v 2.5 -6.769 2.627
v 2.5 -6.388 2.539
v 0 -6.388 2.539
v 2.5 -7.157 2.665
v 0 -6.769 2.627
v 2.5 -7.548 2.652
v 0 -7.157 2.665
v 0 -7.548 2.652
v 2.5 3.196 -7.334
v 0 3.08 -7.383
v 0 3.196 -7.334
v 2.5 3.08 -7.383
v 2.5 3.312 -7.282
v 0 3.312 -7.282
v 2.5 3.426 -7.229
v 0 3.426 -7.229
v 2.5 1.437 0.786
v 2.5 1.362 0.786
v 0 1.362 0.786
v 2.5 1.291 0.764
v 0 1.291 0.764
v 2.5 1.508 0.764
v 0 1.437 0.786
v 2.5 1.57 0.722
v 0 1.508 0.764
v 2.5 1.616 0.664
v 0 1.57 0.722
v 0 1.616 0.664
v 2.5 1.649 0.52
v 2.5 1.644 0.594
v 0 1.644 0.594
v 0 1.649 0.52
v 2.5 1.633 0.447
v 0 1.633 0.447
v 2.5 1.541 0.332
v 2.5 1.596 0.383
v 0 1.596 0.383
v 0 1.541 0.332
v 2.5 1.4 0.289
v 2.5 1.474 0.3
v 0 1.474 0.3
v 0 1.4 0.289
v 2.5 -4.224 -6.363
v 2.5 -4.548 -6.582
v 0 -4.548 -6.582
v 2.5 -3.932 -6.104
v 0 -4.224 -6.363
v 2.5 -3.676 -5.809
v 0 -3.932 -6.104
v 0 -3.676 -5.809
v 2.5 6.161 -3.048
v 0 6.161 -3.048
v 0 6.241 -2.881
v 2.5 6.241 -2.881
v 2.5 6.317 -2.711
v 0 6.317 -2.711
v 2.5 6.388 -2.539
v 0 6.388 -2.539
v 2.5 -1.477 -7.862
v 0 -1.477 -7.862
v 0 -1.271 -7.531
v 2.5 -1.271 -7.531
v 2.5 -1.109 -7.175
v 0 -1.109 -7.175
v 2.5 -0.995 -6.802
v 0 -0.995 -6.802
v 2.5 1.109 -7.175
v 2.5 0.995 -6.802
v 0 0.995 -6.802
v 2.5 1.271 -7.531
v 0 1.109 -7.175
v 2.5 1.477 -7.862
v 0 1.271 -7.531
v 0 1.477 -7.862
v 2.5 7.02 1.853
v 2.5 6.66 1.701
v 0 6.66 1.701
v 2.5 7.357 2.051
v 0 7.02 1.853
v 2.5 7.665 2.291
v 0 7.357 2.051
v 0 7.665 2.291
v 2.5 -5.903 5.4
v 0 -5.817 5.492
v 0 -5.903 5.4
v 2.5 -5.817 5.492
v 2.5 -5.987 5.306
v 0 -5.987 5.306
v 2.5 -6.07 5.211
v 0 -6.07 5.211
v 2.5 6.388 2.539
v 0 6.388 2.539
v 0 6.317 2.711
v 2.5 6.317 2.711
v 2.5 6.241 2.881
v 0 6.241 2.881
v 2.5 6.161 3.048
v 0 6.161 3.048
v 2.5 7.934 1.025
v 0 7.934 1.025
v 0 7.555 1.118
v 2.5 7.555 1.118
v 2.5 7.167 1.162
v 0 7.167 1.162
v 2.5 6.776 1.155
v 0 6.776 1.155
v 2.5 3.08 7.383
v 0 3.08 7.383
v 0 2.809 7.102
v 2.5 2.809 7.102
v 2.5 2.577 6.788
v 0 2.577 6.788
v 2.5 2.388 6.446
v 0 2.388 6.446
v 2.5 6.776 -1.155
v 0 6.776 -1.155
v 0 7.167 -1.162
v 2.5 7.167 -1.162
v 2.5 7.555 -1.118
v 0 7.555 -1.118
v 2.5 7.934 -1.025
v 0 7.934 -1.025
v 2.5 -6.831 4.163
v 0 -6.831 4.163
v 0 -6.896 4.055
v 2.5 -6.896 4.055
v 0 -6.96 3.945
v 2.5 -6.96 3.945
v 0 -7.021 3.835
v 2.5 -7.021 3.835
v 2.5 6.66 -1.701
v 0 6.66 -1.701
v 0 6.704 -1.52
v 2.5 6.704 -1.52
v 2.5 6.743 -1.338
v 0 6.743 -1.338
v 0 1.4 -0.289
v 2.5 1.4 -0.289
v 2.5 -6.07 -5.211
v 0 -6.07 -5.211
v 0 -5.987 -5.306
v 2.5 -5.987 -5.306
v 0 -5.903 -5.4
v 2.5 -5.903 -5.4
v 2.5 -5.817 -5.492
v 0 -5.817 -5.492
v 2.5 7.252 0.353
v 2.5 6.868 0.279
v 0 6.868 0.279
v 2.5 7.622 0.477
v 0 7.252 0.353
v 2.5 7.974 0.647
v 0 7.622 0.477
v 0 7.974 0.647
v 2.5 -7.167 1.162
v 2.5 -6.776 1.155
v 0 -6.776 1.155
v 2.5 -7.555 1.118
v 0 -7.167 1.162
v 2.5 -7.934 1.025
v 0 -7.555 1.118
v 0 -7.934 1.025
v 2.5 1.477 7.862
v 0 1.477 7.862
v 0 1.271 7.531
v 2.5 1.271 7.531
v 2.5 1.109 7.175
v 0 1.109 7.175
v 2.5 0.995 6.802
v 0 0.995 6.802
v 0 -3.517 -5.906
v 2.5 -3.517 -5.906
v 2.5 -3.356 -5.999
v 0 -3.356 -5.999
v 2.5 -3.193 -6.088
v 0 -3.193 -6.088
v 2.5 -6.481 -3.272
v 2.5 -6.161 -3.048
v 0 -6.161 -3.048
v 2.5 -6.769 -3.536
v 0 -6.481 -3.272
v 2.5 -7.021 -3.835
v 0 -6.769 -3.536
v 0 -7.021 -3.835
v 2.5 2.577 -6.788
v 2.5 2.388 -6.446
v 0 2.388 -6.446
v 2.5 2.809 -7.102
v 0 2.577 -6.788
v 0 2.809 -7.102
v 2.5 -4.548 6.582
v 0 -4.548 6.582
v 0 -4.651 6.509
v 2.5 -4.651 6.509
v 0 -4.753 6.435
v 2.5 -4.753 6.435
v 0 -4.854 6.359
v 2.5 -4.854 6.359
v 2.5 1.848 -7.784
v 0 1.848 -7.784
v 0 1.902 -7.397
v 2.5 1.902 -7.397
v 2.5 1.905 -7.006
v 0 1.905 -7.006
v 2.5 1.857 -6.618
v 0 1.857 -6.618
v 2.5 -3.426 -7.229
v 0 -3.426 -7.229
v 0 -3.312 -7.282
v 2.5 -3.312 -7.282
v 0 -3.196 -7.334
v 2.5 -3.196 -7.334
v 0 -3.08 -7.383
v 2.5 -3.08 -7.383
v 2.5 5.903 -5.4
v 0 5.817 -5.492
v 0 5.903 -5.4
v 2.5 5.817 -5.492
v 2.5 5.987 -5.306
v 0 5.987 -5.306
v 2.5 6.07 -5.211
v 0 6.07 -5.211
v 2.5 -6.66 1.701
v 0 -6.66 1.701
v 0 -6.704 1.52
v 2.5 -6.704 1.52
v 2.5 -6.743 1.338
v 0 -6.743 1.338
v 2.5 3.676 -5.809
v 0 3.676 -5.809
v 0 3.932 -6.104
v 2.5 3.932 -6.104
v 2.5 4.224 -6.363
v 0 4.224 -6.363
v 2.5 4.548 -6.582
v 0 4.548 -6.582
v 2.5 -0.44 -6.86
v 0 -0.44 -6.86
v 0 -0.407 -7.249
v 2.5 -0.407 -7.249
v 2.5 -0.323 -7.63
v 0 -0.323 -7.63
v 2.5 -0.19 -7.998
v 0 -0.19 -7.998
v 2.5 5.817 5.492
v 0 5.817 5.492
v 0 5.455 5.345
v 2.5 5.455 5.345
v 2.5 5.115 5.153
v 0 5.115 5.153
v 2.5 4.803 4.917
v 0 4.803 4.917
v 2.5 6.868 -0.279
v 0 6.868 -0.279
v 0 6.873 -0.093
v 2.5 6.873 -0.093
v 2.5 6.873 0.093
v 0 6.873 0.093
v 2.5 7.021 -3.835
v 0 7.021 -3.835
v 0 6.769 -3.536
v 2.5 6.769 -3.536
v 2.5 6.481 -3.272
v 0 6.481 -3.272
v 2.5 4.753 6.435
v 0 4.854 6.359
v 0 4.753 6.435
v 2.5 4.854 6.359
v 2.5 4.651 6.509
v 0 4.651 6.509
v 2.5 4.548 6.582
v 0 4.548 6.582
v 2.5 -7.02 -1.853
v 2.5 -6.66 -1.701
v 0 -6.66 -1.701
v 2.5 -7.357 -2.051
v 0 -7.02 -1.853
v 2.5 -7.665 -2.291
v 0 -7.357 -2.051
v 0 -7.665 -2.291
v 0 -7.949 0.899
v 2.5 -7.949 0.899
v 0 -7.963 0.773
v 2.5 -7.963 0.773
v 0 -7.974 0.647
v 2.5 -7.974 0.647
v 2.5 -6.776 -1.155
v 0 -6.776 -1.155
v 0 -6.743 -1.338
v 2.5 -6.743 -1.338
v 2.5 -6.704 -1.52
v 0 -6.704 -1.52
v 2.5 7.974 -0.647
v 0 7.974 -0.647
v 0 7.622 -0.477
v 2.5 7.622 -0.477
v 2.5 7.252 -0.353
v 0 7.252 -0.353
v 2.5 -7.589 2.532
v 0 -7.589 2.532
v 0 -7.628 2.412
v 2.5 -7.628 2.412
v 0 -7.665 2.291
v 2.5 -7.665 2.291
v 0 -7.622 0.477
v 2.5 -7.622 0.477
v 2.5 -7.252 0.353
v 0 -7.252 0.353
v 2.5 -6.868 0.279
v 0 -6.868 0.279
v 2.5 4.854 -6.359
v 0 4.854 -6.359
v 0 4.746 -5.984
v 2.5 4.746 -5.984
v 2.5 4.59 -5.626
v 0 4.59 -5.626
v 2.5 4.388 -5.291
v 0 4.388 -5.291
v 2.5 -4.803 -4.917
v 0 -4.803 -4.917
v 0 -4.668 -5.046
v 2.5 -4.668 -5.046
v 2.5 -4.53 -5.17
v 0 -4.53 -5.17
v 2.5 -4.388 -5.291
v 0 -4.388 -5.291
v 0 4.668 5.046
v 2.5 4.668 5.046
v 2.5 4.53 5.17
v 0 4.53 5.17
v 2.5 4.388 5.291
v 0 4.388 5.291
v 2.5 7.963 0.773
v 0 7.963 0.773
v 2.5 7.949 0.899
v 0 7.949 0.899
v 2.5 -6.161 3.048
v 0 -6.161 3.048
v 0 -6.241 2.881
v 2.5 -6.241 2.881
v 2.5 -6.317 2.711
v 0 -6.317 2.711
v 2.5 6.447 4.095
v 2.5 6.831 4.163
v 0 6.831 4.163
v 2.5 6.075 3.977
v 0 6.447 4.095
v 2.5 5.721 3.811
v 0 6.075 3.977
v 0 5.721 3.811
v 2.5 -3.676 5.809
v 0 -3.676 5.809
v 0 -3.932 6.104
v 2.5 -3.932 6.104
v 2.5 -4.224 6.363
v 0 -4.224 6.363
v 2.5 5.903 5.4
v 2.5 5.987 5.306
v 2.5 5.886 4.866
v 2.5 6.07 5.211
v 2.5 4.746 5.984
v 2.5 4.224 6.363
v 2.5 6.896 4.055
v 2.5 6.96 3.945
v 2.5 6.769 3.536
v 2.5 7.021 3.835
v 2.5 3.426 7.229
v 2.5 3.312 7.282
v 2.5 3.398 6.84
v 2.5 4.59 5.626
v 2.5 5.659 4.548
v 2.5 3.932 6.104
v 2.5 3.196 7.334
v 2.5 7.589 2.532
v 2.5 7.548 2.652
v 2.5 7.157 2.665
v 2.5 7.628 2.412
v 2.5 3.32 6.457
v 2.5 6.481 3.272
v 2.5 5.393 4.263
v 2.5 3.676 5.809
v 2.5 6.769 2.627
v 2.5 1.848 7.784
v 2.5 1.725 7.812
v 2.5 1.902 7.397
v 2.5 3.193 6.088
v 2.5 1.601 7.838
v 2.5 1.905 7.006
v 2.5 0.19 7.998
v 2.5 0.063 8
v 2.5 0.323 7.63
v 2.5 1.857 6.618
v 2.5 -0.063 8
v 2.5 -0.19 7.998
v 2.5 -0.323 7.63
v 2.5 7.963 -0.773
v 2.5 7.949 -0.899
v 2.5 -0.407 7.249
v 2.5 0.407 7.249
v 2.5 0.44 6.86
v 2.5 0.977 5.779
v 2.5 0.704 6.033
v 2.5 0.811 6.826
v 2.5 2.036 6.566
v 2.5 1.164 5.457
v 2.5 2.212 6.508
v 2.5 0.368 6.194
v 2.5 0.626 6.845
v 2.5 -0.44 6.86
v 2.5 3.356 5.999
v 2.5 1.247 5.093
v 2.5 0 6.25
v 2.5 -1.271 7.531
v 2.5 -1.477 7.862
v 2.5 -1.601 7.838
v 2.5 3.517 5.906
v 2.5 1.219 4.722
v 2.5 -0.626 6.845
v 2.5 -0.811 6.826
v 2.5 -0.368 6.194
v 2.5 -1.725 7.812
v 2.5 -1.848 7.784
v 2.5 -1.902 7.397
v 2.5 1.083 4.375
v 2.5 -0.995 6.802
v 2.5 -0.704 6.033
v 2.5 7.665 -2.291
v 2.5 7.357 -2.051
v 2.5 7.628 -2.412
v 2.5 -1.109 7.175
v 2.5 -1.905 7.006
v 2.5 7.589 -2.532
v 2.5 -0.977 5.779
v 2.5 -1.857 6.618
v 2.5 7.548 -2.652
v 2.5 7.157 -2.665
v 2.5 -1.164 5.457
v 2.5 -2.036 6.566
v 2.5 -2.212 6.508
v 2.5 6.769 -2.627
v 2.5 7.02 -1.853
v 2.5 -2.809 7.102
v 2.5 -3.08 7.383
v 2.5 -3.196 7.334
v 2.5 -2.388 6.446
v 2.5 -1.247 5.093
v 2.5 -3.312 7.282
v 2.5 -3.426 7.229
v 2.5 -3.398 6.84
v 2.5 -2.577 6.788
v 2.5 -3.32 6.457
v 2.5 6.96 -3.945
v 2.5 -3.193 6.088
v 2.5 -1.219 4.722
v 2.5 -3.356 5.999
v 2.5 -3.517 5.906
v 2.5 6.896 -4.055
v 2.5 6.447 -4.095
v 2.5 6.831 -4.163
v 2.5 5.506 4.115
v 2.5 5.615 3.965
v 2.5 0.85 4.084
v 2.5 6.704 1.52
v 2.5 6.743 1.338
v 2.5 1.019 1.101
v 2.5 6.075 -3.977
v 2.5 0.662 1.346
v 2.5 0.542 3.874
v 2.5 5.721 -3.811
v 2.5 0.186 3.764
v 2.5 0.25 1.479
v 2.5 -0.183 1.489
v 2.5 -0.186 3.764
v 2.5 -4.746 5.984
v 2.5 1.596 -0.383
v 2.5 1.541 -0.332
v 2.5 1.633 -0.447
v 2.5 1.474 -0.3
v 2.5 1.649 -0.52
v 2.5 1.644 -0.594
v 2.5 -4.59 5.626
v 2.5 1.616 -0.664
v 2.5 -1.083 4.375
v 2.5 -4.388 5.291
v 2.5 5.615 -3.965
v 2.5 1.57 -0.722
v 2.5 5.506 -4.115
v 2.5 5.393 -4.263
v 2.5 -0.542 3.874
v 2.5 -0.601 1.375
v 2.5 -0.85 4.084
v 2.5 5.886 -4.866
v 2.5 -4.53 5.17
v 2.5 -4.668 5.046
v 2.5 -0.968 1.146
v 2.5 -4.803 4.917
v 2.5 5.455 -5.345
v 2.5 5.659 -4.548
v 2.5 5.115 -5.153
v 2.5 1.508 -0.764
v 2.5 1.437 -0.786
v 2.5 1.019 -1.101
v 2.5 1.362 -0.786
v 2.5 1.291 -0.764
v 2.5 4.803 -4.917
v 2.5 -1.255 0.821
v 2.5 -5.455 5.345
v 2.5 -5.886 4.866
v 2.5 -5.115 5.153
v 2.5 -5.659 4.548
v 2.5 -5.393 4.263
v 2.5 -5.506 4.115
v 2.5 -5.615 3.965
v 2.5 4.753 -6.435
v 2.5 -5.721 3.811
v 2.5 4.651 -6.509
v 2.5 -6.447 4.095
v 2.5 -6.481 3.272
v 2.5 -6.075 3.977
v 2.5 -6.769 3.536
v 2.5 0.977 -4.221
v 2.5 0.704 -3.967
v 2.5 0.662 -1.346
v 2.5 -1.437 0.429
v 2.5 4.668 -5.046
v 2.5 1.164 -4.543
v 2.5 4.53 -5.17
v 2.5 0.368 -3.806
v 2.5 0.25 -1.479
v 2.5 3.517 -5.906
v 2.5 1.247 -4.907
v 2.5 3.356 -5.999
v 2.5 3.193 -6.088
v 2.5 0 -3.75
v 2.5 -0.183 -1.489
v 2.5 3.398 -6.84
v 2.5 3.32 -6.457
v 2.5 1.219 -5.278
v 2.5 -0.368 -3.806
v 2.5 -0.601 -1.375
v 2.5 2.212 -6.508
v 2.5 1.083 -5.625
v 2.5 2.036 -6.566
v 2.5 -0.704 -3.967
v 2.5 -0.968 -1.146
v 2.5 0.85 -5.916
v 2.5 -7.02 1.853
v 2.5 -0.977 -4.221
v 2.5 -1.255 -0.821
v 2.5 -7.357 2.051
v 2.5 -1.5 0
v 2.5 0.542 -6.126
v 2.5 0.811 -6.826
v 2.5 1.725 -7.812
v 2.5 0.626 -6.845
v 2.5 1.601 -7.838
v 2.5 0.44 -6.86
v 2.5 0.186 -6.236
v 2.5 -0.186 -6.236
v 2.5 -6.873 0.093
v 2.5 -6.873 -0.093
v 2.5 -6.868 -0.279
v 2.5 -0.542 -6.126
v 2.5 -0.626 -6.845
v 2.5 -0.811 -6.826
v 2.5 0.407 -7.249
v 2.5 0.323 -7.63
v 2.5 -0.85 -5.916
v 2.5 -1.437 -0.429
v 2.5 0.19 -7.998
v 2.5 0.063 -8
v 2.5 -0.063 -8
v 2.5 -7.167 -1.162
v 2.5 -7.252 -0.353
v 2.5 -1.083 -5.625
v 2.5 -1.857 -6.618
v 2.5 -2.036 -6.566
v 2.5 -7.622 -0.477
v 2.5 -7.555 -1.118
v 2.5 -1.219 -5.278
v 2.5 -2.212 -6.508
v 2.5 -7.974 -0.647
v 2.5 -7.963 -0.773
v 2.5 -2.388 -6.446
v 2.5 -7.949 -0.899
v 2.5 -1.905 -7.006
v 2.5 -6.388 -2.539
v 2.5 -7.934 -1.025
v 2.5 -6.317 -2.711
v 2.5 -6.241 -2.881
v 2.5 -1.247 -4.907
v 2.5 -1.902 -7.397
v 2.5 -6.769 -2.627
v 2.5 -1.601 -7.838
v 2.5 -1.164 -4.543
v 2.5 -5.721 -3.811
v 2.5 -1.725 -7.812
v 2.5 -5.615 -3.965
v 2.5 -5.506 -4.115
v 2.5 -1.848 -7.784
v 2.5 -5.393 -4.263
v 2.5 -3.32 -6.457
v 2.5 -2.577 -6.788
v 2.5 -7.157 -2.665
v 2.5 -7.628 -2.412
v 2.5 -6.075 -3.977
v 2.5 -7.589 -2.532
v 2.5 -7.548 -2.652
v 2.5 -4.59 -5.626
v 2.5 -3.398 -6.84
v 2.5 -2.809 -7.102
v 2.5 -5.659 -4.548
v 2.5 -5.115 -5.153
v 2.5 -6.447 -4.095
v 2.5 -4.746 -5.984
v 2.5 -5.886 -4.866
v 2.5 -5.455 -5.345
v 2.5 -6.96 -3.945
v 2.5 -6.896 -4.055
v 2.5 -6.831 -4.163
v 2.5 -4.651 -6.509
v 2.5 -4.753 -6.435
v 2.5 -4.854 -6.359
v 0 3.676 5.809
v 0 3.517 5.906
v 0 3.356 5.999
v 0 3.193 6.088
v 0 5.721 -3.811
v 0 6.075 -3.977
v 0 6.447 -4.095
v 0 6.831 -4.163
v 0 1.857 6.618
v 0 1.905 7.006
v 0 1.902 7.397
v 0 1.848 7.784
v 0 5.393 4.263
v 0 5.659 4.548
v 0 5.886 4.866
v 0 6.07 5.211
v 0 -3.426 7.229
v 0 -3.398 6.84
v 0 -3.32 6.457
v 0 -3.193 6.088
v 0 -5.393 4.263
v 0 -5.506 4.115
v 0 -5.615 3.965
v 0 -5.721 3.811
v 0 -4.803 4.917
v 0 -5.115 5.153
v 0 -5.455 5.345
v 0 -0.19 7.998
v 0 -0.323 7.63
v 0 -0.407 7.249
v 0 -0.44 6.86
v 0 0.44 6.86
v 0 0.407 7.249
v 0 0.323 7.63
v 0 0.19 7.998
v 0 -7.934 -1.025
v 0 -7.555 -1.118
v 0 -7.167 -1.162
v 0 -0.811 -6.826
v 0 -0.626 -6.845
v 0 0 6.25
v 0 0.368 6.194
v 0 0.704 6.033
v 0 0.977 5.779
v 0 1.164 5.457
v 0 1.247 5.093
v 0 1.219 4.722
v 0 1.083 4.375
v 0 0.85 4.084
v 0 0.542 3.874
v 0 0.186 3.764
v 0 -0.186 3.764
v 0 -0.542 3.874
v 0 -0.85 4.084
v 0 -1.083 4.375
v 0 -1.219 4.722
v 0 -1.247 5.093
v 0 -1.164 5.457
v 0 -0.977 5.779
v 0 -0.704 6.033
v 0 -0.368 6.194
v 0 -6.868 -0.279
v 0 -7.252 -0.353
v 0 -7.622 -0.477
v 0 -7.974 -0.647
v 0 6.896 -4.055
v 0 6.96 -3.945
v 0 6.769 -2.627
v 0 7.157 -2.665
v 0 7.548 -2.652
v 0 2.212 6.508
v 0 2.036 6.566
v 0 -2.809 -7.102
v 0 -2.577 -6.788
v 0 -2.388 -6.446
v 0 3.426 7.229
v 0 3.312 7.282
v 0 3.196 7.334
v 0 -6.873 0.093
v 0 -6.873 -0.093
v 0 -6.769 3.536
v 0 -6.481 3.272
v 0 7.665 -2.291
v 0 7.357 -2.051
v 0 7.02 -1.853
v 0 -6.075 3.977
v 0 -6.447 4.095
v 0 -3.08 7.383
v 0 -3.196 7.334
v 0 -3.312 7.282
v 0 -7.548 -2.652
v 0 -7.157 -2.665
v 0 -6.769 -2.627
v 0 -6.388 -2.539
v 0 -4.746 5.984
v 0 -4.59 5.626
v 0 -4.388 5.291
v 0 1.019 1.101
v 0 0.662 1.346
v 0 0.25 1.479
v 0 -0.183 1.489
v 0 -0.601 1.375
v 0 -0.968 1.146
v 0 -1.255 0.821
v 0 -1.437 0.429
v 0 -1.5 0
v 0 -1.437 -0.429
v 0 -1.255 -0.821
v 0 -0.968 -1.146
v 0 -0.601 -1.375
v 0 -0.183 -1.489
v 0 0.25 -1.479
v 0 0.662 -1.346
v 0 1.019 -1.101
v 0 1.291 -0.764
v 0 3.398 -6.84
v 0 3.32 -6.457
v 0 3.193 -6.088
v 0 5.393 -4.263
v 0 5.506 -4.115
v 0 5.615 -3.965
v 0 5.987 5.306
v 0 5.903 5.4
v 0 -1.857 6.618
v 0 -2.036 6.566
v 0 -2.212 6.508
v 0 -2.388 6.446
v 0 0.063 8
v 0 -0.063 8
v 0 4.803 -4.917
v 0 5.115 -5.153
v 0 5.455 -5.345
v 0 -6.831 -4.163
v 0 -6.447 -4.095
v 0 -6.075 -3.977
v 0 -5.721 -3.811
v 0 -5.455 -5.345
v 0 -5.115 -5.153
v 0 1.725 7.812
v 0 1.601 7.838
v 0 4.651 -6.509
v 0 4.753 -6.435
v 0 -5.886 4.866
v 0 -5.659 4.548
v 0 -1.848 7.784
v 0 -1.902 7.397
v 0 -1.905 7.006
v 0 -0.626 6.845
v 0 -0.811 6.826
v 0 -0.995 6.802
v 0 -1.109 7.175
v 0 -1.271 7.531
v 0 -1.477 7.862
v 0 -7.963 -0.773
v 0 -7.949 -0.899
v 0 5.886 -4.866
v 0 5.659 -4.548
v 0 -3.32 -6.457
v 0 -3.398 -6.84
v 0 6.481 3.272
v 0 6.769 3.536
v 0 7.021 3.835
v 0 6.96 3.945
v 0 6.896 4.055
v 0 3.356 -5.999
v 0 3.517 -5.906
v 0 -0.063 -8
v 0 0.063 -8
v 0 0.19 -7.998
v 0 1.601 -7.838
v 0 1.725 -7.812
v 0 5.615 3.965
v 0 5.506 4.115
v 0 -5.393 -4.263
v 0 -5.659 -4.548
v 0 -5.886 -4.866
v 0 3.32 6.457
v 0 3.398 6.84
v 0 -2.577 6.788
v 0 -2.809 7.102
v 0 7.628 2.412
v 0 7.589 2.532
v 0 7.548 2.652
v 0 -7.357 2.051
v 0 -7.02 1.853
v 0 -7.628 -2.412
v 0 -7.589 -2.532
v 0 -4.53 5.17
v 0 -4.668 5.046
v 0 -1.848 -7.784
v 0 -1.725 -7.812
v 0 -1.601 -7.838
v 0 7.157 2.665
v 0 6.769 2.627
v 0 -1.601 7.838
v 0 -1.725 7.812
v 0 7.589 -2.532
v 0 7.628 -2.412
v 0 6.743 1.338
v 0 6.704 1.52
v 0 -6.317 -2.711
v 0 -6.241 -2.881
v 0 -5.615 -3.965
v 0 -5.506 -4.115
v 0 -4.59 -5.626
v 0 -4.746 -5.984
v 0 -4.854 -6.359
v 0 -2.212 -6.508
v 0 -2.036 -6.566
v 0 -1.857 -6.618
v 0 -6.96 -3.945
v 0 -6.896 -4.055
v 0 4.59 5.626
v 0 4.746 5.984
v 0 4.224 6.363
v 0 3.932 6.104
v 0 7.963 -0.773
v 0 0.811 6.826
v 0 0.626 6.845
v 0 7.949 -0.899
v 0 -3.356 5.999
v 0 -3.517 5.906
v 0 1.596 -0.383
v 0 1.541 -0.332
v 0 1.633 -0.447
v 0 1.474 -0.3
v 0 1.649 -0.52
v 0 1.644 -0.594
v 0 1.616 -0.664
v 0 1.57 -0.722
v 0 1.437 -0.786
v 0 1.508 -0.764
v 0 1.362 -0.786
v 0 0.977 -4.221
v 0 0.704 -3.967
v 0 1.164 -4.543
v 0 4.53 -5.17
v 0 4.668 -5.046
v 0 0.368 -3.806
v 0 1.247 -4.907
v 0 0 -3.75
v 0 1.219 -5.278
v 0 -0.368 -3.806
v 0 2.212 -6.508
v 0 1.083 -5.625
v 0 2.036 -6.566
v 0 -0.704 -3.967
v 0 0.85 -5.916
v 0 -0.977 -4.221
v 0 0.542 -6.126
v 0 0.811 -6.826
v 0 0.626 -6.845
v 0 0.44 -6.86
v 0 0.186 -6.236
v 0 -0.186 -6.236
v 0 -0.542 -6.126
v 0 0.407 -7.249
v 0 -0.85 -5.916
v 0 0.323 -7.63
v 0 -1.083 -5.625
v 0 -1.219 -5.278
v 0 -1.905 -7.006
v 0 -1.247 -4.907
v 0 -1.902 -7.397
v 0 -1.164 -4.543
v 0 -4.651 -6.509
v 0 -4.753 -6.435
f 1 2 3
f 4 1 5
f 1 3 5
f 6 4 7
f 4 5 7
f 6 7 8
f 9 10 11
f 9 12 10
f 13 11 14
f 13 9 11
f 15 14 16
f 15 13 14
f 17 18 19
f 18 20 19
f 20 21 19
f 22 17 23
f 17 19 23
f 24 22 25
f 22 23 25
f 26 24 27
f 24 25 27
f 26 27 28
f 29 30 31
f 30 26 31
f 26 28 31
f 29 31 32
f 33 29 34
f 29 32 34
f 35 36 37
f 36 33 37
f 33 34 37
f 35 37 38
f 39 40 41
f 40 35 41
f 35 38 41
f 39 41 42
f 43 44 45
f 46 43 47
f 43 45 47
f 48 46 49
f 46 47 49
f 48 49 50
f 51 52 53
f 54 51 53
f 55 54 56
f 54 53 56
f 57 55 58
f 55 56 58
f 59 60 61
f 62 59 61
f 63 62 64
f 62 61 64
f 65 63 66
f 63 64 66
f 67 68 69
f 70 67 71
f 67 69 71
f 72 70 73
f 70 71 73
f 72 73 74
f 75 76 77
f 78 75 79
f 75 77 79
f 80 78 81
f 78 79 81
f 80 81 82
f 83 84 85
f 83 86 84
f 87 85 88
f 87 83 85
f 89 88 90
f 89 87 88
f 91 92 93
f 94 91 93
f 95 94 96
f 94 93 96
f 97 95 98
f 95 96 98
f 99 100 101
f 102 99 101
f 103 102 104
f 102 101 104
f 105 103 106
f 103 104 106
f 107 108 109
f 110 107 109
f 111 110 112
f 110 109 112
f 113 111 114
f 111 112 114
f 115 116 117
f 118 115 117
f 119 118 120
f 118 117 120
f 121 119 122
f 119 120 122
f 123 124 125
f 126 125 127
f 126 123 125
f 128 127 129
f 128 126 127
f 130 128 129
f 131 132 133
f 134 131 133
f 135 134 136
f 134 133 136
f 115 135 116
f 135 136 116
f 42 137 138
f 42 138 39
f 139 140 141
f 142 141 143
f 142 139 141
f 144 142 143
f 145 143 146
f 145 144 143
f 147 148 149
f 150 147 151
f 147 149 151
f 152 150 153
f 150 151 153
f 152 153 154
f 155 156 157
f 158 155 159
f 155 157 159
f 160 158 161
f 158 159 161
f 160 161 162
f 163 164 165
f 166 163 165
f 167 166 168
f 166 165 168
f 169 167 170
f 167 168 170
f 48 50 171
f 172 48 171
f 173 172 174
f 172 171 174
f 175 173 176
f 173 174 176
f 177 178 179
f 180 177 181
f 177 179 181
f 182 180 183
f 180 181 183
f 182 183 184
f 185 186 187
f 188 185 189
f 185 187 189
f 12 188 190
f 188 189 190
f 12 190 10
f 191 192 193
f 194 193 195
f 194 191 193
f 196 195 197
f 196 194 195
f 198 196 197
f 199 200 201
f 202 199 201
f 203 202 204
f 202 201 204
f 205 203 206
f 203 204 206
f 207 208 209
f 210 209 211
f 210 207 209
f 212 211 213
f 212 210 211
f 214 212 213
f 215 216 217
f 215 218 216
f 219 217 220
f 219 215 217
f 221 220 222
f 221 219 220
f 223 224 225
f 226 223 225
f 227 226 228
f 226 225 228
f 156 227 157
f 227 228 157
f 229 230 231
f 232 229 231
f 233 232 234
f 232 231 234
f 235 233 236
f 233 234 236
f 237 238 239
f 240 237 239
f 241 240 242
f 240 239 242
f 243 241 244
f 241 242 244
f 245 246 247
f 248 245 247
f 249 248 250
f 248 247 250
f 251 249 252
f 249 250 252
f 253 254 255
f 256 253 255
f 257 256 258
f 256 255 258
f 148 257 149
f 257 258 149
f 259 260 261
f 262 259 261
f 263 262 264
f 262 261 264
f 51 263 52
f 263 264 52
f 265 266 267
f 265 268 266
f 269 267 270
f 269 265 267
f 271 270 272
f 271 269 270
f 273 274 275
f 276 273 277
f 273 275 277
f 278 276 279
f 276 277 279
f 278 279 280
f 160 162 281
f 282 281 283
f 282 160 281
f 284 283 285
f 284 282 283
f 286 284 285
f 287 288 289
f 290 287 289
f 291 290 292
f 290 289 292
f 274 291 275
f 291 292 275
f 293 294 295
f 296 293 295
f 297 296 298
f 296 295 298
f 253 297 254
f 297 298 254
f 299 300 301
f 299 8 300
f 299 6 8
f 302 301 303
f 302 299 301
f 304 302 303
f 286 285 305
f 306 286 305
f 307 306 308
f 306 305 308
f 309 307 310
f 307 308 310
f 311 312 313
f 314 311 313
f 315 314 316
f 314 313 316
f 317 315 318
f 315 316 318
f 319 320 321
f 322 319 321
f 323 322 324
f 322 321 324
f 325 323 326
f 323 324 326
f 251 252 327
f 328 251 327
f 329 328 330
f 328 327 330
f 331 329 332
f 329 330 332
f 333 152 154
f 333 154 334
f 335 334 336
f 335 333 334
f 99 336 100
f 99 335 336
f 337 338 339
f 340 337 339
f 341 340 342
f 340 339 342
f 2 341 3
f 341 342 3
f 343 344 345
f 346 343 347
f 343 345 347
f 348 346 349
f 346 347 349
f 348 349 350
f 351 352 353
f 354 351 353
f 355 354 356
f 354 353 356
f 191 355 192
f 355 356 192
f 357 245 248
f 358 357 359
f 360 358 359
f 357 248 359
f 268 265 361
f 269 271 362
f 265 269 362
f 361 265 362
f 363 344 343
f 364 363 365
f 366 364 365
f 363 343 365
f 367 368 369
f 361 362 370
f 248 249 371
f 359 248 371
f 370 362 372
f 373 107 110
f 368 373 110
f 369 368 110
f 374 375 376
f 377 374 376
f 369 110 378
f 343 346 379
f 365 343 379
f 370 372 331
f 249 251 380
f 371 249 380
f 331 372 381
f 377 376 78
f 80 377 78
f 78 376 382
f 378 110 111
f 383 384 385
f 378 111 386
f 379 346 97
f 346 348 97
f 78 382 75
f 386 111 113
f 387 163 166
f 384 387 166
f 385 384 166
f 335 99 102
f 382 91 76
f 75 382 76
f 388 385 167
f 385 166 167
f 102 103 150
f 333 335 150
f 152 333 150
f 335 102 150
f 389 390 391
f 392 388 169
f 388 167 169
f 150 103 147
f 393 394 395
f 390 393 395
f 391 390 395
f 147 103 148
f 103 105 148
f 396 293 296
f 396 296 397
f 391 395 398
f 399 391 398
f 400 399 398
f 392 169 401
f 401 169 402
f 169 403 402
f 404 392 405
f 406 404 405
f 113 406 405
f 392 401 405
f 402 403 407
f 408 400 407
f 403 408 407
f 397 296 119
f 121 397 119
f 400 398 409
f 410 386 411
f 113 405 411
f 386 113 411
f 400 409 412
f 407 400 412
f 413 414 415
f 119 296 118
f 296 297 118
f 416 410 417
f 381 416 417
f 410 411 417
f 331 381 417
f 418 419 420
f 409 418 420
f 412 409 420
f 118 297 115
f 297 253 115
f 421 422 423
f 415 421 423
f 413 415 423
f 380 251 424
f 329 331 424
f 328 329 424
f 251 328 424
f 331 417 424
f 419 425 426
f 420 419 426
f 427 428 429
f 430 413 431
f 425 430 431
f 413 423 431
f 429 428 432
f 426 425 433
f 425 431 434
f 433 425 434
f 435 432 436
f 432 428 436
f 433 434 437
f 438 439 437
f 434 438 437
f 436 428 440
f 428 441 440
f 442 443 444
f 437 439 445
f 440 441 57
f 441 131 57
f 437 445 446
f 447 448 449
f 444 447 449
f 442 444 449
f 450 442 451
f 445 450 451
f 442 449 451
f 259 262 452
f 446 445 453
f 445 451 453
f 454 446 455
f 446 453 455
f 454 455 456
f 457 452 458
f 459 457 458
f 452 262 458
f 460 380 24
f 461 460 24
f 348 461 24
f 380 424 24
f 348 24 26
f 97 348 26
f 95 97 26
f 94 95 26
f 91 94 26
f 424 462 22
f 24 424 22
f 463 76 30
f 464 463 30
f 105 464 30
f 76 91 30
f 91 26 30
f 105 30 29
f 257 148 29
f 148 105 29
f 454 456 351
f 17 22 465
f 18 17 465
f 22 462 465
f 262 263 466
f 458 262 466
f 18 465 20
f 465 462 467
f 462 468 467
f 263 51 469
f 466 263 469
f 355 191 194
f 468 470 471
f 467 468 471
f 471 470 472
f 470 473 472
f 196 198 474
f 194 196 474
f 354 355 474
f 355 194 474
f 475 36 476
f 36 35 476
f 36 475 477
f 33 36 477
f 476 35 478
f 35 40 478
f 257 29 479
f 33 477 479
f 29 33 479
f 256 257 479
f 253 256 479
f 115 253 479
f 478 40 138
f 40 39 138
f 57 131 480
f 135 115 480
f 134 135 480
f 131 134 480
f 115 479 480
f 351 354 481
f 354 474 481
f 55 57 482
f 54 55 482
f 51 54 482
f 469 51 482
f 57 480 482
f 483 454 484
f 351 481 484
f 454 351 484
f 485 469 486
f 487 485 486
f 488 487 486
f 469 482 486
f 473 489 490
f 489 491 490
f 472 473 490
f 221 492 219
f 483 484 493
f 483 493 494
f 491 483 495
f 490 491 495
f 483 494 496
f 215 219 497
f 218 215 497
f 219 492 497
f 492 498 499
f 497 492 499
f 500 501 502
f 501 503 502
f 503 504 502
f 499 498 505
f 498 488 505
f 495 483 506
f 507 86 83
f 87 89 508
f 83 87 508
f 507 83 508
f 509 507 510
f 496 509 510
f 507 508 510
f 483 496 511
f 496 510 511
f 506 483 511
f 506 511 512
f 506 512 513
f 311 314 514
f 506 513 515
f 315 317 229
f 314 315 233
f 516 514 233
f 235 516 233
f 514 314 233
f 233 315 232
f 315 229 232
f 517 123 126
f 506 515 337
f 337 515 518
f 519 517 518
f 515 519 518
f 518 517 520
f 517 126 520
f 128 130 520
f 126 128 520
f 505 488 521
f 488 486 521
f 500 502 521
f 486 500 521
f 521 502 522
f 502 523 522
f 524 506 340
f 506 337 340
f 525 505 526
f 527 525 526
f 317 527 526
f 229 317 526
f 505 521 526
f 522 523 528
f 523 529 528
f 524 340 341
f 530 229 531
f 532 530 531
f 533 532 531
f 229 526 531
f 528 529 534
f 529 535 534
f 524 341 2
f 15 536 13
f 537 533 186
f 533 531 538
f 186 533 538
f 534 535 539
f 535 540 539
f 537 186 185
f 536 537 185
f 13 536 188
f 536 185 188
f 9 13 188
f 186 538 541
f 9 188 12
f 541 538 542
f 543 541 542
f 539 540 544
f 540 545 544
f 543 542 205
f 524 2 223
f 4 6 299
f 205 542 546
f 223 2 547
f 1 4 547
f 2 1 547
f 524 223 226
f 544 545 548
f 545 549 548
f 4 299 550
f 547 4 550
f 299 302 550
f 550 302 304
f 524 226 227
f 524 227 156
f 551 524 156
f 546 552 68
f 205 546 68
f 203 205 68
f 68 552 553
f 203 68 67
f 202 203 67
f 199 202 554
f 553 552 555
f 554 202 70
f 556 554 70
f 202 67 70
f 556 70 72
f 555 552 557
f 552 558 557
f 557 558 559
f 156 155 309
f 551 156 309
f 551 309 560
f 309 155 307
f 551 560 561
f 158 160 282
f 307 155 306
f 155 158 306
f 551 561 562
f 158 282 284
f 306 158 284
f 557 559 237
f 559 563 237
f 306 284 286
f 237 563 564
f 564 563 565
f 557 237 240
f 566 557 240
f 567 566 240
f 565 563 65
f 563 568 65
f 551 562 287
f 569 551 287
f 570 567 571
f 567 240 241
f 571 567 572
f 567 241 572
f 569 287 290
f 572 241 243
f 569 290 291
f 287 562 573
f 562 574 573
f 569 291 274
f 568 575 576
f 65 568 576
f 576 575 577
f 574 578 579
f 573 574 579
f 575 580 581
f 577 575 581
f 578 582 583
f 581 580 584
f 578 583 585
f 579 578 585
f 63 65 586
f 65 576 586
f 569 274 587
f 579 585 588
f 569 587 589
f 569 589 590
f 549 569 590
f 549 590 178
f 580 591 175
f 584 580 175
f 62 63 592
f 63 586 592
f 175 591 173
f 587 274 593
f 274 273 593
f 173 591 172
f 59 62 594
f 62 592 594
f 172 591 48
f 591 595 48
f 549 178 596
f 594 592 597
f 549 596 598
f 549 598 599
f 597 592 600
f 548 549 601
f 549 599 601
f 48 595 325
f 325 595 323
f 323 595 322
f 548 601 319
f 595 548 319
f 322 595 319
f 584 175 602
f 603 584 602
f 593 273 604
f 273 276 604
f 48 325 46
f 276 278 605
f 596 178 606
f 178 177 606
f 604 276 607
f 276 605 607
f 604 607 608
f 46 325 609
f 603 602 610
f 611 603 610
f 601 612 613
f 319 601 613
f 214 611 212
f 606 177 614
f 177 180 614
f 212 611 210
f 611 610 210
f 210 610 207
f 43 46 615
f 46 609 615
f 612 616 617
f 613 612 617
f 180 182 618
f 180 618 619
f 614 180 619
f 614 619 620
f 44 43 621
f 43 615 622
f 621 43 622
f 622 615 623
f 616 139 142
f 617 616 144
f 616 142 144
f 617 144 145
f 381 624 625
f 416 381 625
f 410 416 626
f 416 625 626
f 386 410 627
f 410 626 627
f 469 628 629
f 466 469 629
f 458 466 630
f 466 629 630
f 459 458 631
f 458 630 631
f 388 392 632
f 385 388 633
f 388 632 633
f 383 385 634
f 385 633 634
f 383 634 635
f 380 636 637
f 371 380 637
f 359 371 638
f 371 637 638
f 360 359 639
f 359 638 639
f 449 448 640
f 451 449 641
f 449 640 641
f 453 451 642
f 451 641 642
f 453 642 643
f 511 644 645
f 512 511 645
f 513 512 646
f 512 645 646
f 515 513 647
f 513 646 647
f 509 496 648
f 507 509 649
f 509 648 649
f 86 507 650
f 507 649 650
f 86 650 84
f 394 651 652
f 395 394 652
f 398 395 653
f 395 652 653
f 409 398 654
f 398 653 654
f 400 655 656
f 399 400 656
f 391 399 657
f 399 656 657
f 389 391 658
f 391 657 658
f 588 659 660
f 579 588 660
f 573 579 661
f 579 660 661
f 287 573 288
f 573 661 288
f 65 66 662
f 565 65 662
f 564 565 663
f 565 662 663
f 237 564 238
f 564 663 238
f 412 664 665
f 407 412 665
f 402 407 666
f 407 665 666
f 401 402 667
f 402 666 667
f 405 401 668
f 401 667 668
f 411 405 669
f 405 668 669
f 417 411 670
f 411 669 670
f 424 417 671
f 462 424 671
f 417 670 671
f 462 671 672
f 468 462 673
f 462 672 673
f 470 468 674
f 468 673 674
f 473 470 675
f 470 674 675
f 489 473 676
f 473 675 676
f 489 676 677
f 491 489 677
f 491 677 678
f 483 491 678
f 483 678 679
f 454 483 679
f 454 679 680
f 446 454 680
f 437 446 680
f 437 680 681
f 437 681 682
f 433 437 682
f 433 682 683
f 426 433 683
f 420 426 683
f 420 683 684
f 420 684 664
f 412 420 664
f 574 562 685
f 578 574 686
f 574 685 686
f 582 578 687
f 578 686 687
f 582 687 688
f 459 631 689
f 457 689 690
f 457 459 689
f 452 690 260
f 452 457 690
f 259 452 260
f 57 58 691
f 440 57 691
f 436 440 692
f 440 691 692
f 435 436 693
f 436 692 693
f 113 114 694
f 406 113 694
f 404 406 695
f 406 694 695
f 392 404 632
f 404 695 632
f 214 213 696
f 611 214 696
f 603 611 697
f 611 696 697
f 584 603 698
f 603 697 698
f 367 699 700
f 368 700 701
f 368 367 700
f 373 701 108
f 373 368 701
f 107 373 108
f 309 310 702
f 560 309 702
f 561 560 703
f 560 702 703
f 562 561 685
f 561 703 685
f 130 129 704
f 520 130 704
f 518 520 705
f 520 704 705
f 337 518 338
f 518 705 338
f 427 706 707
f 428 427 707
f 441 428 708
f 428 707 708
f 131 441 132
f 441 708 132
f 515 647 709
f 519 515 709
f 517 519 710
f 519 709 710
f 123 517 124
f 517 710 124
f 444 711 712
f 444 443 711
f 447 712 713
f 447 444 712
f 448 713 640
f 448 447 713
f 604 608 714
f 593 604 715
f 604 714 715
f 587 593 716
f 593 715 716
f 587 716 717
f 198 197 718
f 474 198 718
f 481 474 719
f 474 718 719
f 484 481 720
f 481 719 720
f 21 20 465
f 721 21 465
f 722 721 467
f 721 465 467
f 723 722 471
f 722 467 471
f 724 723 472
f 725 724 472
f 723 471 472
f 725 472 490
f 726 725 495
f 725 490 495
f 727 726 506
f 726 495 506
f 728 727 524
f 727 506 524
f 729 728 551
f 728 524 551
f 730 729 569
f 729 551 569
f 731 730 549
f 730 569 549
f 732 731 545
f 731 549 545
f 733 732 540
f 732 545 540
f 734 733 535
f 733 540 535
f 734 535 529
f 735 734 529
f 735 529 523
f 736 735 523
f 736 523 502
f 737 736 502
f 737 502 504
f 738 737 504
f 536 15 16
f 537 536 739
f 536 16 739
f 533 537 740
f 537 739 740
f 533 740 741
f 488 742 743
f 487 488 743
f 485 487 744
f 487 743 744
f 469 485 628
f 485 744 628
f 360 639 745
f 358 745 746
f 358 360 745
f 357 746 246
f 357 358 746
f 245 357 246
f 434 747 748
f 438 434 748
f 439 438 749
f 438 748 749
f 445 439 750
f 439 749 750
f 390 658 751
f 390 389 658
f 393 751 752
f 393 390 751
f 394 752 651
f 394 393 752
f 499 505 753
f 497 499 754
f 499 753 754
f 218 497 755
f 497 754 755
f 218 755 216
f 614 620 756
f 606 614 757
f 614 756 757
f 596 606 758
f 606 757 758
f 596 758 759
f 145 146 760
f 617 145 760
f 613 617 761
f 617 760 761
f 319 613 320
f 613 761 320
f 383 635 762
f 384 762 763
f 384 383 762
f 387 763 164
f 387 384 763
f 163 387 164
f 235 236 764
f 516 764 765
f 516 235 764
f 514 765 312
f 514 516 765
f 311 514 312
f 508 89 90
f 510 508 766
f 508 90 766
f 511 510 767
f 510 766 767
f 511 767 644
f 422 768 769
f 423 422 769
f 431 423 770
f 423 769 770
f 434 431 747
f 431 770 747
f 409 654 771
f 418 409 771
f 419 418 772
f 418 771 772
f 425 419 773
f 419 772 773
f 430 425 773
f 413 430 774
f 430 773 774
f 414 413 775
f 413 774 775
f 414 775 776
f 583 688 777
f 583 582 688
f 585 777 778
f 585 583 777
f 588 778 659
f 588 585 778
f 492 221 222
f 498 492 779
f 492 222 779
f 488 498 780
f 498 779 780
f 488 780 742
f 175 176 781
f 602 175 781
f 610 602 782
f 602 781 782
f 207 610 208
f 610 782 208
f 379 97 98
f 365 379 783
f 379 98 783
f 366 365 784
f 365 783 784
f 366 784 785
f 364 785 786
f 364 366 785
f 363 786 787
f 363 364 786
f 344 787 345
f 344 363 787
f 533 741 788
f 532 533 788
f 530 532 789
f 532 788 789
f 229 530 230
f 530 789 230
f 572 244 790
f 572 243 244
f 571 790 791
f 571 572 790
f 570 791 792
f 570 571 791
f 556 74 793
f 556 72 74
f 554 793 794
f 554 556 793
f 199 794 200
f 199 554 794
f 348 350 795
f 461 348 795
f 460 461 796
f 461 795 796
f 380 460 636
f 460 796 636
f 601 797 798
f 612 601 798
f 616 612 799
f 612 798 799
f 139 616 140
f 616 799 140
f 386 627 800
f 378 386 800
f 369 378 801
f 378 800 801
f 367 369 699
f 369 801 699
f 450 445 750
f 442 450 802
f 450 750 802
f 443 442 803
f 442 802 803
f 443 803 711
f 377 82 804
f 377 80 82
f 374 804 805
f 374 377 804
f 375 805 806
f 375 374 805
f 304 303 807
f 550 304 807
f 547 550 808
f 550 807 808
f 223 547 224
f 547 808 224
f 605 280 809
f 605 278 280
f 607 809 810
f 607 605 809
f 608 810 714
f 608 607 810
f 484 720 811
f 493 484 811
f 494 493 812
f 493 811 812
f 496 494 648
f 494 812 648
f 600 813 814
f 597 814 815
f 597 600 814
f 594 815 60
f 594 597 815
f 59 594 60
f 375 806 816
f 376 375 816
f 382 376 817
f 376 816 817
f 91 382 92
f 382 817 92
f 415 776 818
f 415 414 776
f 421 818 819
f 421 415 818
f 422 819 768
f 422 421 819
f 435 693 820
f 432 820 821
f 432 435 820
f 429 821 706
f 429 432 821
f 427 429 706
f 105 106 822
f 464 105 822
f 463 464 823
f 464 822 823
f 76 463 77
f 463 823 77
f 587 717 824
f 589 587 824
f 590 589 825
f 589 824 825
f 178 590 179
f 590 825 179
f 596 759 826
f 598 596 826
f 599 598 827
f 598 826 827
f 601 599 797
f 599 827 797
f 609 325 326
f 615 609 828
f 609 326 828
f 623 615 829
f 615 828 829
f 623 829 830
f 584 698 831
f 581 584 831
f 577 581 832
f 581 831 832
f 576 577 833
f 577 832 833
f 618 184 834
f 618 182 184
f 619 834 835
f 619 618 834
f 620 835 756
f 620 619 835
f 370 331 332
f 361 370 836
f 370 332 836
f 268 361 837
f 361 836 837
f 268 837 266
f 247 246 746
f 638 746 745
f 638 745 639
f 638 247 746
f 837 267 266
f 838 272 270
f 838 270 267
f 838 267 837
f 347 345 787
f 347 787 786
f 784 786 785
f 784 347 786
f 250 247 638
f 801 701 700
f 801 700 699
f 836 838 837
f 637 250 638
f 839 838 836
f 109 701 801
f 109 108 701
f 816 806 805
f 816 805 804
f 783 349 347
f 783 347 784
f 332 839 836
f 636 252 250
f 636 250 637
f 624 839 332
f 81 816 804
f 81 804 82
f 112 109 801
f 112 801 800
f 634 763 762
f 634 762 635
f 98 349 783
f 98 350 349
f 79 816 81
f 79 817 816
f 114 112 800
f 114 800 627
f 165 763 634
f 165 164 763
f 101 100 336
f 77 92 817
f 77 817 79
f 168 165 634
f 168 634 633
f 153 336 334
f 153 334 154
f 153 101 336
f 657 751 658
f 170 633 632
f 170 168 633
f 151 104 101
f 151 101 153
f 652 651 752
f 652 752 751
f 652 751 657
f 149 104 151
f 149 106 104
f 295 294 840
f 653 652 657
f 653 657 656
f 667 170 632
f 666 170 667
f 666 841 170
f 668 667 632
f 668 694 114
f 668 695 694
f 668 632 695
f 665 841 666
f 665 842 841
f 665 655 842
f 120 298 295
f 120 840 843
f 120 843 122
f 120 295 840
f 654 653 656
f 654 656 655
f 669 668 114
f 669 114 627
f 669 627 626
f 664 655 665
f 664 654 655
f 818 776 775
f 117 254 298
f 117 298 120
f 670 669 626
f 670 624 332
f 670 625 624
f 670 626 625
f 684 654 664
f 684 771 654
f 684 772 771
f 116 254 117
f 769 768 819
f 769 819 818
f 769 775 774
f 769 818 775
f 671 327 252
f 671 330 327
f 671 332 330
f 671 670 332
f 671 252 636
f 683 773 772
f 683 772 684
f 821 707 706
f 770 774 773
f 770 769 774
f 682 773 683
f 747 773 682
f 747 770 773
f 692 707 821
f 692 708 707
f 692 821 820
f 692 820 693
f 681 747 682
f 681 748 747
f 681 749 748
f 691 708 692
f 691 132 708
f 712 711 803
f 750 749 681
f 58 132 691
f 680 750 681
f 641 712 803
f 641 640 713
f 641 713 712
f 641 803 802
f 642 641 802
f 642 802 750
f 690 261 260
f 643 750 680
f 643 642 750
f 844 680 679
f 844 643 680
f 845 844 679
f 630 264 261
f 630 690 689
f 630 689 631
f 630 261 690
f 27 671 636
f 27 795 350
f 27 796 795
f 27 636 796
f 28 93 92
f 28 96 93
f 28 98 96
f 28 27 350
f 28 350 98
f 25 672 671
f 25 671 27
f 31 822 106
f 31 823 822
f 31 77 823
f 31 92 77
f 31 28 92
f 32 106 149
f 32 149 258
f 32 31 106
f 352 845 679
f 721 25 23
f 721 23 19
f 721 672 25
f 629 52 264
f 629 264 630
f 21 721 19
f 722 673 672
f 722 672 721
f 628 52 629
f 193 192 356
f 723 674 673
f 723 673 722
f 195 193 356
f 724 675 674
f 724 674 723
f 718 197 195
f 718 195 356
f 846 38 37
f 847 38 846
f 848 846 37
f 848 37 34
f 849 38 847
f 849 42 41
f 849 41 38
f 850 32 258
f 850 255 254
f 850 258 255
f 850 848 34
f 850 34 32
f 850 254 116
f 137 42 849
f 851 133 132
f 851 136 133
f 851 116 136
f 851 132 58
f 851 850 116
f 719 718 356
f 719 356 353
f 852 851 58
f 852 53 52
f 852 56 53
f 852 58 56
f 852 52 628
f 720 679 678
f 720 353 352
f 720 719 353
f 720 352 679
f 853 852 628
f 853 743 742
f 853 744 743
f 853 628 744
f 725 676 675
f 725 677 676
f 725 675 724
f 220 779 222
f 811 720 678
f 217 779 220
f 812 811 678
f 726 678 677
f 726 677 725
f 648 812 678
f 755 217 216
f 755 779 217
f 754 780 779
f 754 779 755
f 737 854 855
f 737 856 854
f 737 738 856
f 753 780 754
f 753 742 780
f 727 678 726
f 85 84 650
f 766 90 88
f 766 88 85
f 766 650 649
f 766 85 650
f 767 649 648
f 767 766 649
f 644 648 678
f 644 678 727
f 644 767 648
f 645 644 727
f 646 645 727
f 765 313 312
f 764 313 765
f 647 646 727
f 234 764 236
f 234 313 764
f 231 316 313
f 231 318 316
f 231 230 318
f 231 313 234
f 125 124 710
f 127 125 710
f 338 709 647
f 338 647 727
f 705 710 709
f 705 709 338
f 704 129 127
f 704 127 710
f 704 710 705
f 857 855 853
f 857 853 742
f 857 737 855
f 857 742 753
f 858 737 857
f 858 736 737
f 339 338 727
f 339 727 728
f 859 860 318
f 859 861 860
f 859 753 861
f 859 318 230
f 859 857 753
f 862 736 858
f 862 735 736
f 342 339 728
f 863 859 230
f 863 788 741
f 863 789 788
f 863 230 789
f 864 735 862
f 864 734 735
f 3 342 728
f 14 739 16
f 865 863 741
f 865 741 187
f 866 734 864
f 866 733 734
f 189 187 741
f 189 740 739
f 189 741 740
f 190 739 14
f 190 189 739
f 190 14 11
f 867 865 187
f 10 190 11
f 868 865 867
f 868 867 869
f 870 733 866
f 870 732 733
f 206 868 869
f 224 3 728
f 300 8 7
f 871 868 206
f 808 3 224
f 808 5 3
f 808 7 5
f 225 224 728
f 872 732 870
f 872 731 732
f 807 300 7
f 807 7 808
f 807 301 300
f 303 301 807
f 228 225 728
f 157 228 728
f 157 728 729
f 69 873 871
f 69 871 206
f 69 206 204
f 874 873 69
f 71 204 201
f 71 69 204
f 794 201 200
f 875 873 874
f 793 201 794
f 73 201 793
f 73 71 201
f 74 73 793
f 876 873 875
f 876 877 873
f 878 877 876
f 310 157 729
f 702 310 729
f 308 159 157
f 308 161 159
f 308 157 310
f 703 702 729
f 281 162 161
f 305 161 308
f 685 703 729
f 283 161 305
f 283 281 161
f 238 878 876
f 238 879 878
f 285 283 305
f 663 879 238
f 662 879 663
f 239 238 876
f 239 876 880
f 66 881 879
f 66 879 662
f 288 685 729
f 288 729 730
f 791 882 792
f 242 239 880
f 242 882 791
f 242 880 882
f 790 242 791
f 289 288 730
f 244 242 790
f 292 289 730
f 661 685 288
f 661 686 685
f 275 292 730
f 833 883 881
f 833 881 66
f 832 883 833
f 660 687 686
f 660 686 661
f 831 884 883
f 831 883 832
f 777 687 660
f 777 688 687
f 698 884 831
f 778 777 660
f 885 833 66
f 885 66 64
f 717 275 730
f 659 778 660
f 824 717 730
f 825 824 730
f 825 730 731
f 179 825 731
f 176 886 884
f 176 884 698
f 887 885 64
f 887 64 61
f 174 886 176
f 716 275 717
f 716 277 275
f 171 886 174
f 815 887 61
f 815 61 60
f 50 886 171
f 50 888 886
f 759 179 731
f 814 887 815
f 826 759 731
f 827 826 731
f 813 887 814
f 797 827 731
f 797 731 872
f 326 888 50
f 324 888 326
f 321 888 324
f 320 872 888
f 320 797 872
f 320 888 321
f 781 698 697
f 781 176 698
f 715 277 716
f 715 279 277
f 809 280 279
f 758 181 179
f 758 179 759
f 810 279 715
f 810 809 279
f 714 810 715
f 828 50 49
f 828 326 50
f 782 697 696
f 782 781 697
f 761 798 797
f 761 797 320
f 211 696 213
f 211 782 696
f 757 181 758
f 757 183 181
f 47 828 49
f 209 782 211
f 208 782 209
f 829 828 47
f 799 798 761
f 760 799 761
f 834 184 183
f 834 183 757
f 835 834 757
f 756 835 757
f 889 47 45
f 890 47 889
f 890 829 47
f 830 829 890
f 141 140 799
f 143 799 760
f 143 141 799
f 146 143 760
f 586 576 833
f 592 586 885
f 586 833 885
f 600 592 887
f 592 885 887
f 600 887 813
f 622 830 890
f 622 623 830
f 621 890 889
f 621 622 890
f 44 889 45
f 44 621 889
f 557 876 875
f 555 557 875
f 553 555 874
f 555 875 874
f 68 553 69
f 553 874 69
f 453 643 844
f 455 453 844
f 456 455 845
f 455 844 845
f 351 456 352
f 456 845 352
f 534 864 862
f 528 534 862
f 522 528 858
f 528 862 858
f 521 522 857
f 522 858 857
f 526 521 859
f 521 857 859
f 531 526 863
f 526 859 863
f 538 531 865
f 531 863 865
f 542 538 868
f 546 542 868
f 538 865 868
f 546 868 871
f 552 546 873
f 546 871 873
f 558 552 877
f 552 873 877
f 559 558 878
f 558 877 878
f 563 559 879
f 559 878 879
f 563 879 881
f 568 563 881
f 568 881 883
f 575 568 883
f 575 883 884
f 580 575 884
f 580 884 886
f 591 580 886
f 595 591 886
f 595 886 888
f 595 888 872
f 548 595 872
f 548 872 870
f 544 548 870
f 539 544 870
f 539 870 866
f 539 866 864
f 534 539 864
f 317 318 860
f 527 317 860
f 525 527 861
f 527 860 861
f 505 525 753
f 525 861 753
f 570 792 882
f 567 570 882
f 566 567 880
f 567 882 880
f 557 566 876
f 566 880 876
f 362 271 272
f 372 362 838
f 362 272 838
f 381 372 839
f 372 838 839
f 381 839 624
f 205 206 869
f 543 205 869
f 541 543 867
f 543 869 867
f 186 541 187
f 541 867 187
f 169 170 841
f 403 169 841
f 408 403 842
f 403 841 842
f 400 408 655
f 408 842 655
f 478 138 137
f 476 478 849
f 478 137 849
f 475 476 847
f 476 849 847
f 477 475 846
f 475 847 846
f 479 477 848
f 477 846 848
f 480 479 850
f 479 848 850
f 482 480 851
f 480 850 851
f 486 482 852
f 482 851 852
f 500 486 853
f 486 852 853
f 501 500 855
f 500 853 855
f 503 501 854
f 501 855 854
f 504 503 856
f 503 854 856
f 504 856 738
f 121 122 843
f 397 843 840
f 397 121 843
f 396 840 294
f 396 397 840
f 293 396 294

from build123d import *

# Parameters (mm, degrees)
BASPROSKE_W         = 2.5
BASPROSKE_H         = 8
TOOTHCUT_DEPTH      = 12.586630226
TEETHCUTS_COUNT     = 30
TEETHCUTS_ANGLE     = 348
BORSKE_R            = 1.5
BORE_DEPTH          = 50.0000508
SKETCH_3_R          = 1.25
CUT_EXTRUDE_1_DEPTH = 12.568528524
EXTRUDE_1_DEPTH     = 2.5
SKETCH_5_R          = 0.25
CUT_EXTRUDE_2_DEPTH = 12.568528524


with BuildPart() as part:
    # BasProSke → Base-Revolve (revolve)
    with BuildSketch(Plane(origin=(0, 0, 0), x_dir=(1, 0, 0), z_dir=(0, 1, 0)), mode=Mode.PRIVATE) as base_revolve_sk:
        with Locations((1.25, 4)):
            Rectangle(BASPROSKE_W, BASPROSKE_H)
    revolve(base_revolve_sk.sketch.rotate(Axis((-10, 0, 0), (1, 0, 0)), 180), axis=Axis((-10, 0, 0), (1, 0, 0)))

    # TooCutSke → ToothCut (cut, through all)
    with BuildSketch(Plane(origin=(0, 0, 0), x_dir=(0, 0, -1), z_dir=(1, 0, 0))):
        with BuildLine():
            ThreePointArc((0.279013782, 6.868335119), (0, 6.874), (-0.279013782, 6.868335119))
            ThreePointArc((-0.279013782, 6.868335119), (-0.413500328, 7.452412324), (-0.661410108, 7.998098638))
            ThreePointArc((-0.661410108, 7.998098638), (0, 8.0254), (0.661410108, 7.998098638))
            ThreePointArc((0.661410108, 7.998098638), (0.413500328, 7.452412324), (0.279013782, 6.868335119))
        make_face()
    toothcut = extrude(amount=TOOTHCUT_DEPTH, mode=Mode.SUBTRACT)

    # TeethCuts: ToothCut ×30 about axis
    teethcuts_axis = Axis((-10, 0, 0), (1, 0, 0))
    for i in range(1, TEETHCUTS_COUNT):
        add(toothcut.rotate(teethcuts_axis, i * TEETHCUTS_ANGLE / (TEETHCUTS_COUNT - 1)), mode=Mode.SUBTRACT)

    # BorSke → Bore (cut, symmetric)
    with BuildSketch(Plane(origin=(0, 0, 0), x_dir=(0, 0, -1), z_dir=(1, 0, 0))):
        with Locations(Location((0, 0, 0), (0, 0, 180))):
            Circle(BORSKE_R)
    extrude(amount=BORE_DEPTH, both=True, mode=Mode.SUBTRACT)

    # 草图3 → 切除-拉伸1 (cut, through all)
    with BuildSketch(Plane.ZY):
        with Locations((-5, 0)):
            Circle(SKETCH_3_R)
        with Locations((5, 0)):
            Circle(SKETCH_3_R)
    extrude(amount=-CUT_EXTRUDE_1_DEPTH, mode=Mode.SUBTRACT)

    # 草图4 → 凸台-拉伸1 (add, through all)
    with BuildSketch(Plane.ZY):
        with BuildLine():
            Line((-0.538516481, 1.4), (0.538516481, 1.4))
            ThreePointArc((0.538516481, 1.4), (0, 1.5), (-0.538516481, 1.4))
        make_face()
    extrude(amount=-EXTRUDE_1_DEPTH)

    # 草图5 → 切除-拉伸2 (cut, through all)
    with BuildSketch(Plane.ZY):
        with Locations((-0.538516481, 1.4)):
            Circle(SKETCH_5_R)
        with Locations((0.538516481, 1.4)):
            Circle(SKETCH_5_R)
    extrude(amount=-CUT_EXTRUDE_2_DEPTH, mode=Mode.SUBTRACT)


solid = part.part
